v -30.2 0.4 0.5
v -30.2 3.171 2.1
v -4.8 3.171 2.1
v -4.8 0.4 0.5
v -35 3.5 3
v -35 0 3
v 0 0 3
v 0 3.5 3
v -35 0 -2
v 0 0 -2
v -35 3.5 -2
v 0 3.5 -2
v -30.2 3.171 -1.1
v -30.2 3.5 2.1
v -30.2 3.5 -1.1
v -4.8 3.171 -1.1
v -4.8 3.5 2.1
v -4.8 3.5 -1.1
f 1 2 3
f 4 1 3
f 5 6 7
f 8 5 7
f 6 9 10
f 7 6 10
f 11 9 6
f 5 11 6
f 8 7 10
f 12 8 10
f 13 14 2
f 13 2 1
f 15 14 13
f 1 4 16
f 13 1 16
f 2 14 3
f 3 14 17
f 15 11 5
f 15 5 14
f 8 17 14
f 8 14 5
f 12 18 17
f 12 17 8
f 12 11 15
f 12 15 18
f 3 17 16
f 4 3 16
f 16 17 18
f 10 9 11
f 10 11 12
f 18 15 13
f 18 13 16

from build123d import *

# Parameters (mm, degrees)
TOP_SKETCH_W                 = 35
TOP_SKETCH_H                 = 5
THICKNESS_EXTRUDE_DEPTH      = 3.5
HANDLE_SKETCH_W              = 25.4
HANDLE_SKETCH_H              = 3.2
HANDLE_SLOT_CUT_DEPTH        = 3.1
HANDLE_SLOT_CHAMFER_1_SIZE   = 1.6
HANDLE_SLOT_CHAMFER_1_SIZE2  = 2.771281292
HANDLE_SLOT_CHAMFER_2_SIZE   = 1.6
HANDLE_SLOT_CHAMFER_2_SIZE_2 = 2.771281292


with BuildPart() as part:
    # Top Sketch → Thickness Extrude (new body)
    with BuildSketch(Plane(origin=(0, 0, 0), x_dir=(1, 0, 0), z_dir=(0, 1, 0))):
        with Locations((-17.5, -0.5)):
            Rectangle(TOP_SKETCH_W, TOP_SKETCH_H)
    extrude(amount=THICKNESS_EXTRUDE_DEPTH)

    # Handle Sketch → Handle Slot Cut (cut)
    with BuildSketch(Plane(origin=(0, 3.5, 0), x_dir=(1, 0, 0), z_dir=(0, 1, 0))):
        with Locations((-17.5, -0.5)):
            Rectangle(HANDLE_SKETCH_W, HANDLE_SKETCH_H)
    extrude(amount=-HANDLE_SLOT_CUT_DEPTH, mode=Mode.SUBTRACT)

    # Handle Slot Chamfer 1
    handle_slot_chamfer_1_edges = [part.edges().sort_by_distance(p)[0] for p in [
        (-17.5, 0.4, 2.1),
    ]]
    handle_slot_chamfer_1_side = [part.faces().sort_by_distance(p)[0] for p in [
        (-17.5, 0.4, 0.5),
    ]]
    chamfer(handle_slot_chamfer_1_edges, length=HANDLE_SLOT_CHAMFER_1_SIZE, length2=HANDLE_SLOT_CHAMFER_1_SIZE2, reference=handle_slot_chamfer_1_side[0])

    # Handle Slot Chamfer 2
    # the kernel refuses this chamfer: 2.771281292, 1.6 mm, written as the material it adds along each edge
    with BuildSketch(Plane(origin=(-37.369542353, 0.4, -1.1), x_dir=(0, -0.057893862402671414, 0.9983227437537925), z_dir=(1, 0, 0))) as handle_slot_chamfer_2_piece_1_section:
        Polygon((HANDLE_SLOT_CHAMFER_2_SIZE * 0.998322743754, -HANDLE_SLOT_CHAMFER_2_SIZE * 0.0578938624027), (-HANDLE_SLOT_CHAMFER_2_SIZE_2 * 0.057893862405, -HANDLE_SLOT_CHAMFER_2_SIZE_2 * 0.998322743793), (0, 0), align=None)
    handle_slot_chamfer_2_piece_1 = extrude(amount=39.739084706, mode=Mode.PRIVATE)
    handle_slot_chamfer_2_piece_1 = split(handle_slot_chamfer_2_piece_1, bisect_by=Plane(origin=(-35, 1.323760431, -0.566666667), z_dir=(1, 0, 0)), keep=Keep.TOP, mode=Mode.PRIVATE)
    handle_slot_chamfer_2_piece_1 = split(handle_slot_chamfer_2_piece_1, bisect_by=Plane(origin=(0, 1.323760431, -0.566666667), z_dir=(-1, 0, 0)), keep=Keep.TOP, mode=Mode.PRIVATE)
    add(handle_slot_chamfer_2_piece_1)


solid = part.part
